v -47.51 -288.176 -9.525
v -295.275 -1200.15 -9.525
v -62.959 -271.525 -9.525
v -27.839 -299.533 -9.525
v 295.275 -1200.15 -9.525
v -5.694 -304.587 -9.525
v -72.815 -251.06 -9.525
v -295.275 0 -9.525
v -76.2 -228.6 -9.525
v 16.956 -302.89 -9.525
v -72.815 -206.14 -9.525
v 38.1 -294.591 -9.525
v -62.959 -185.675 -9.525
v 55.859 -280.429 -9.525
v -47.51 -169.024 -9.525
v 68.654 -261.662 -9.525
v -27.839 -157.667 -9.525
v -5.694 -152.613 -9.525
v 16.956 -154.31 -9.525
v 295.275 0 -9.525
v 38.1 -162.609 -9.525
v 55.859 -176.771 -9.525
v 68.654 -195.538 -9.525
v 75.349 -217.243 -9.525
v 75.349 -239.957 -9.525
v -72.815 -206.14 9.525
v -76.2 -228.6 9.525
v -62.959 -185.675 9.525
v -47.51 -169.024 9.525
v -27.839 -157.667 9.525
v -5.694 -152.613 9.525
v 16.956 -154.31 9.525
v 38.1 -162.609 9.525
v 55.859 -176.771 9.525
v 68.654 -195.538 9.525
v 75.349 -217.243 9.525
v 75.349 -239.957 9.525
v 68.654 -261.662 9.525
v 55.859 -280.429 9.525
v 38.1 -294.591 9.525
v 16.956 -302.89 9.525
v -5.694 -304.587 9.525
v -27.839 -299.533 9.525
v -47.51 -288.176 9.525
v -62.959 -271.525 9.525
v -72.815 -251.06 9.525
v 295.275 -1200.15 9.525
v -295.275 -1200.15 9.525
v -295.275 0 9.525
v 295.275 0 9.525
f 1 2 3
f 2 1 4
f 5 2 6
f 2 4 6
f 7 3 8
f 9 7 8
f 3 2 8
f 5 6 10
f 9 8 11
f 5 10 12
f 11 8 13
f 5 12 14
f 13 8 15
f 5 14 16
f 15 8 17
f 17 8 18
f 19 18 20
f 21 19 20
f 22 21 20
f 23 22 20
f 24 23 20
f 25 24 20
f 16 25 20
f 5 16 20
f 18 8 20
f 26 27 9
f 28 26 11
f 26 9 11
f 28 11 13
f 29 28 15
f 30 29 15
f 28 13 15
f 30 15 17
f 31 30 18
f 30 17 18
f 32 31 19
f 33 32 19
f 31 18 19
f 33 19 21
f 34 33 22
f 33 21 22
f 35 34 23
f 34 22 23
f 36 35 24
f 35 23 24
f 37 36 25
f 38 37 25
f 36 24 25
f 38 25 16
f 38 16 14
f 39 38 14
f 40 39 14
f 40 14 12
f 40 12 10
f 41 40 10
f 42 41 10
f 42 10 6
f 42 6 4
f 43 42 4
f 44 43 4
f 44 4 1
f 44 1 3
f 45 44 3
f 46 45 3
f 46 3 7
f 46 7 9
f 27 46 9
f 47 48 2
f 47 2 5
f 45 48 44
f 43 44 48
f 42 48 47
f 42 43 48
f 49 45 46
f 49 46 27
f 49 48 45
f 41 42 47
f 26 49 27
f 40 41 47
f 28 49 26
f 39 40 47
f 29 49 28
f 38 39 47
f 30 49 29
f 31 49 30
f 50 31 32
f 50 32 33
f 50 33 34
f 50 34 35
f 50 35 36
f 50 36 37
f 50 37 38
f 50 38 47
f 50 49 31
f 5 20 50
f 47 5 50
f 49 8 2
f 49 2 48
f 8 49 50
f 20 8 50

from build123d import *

# Parameters (mm, degrees)
F0_W     = 590.55
F0_H     = 19.05
F1_DEPTH = 1200.15
F3_D     = 152.4


with BuildPart() as f1:
    # F0 (on Front) → F1 (new body)
    with BuildSketch(Plane.XZ):
        Rectangle(F0_W, F0_H)
    extrude(amount=F1_DEPTH)

    # F3 (through all)
    with Locations(Plane.XY.offset(9.525)):
        with Locations((0, -228.6)):
            Hole(F3_D / 2)


solid = f1.part
